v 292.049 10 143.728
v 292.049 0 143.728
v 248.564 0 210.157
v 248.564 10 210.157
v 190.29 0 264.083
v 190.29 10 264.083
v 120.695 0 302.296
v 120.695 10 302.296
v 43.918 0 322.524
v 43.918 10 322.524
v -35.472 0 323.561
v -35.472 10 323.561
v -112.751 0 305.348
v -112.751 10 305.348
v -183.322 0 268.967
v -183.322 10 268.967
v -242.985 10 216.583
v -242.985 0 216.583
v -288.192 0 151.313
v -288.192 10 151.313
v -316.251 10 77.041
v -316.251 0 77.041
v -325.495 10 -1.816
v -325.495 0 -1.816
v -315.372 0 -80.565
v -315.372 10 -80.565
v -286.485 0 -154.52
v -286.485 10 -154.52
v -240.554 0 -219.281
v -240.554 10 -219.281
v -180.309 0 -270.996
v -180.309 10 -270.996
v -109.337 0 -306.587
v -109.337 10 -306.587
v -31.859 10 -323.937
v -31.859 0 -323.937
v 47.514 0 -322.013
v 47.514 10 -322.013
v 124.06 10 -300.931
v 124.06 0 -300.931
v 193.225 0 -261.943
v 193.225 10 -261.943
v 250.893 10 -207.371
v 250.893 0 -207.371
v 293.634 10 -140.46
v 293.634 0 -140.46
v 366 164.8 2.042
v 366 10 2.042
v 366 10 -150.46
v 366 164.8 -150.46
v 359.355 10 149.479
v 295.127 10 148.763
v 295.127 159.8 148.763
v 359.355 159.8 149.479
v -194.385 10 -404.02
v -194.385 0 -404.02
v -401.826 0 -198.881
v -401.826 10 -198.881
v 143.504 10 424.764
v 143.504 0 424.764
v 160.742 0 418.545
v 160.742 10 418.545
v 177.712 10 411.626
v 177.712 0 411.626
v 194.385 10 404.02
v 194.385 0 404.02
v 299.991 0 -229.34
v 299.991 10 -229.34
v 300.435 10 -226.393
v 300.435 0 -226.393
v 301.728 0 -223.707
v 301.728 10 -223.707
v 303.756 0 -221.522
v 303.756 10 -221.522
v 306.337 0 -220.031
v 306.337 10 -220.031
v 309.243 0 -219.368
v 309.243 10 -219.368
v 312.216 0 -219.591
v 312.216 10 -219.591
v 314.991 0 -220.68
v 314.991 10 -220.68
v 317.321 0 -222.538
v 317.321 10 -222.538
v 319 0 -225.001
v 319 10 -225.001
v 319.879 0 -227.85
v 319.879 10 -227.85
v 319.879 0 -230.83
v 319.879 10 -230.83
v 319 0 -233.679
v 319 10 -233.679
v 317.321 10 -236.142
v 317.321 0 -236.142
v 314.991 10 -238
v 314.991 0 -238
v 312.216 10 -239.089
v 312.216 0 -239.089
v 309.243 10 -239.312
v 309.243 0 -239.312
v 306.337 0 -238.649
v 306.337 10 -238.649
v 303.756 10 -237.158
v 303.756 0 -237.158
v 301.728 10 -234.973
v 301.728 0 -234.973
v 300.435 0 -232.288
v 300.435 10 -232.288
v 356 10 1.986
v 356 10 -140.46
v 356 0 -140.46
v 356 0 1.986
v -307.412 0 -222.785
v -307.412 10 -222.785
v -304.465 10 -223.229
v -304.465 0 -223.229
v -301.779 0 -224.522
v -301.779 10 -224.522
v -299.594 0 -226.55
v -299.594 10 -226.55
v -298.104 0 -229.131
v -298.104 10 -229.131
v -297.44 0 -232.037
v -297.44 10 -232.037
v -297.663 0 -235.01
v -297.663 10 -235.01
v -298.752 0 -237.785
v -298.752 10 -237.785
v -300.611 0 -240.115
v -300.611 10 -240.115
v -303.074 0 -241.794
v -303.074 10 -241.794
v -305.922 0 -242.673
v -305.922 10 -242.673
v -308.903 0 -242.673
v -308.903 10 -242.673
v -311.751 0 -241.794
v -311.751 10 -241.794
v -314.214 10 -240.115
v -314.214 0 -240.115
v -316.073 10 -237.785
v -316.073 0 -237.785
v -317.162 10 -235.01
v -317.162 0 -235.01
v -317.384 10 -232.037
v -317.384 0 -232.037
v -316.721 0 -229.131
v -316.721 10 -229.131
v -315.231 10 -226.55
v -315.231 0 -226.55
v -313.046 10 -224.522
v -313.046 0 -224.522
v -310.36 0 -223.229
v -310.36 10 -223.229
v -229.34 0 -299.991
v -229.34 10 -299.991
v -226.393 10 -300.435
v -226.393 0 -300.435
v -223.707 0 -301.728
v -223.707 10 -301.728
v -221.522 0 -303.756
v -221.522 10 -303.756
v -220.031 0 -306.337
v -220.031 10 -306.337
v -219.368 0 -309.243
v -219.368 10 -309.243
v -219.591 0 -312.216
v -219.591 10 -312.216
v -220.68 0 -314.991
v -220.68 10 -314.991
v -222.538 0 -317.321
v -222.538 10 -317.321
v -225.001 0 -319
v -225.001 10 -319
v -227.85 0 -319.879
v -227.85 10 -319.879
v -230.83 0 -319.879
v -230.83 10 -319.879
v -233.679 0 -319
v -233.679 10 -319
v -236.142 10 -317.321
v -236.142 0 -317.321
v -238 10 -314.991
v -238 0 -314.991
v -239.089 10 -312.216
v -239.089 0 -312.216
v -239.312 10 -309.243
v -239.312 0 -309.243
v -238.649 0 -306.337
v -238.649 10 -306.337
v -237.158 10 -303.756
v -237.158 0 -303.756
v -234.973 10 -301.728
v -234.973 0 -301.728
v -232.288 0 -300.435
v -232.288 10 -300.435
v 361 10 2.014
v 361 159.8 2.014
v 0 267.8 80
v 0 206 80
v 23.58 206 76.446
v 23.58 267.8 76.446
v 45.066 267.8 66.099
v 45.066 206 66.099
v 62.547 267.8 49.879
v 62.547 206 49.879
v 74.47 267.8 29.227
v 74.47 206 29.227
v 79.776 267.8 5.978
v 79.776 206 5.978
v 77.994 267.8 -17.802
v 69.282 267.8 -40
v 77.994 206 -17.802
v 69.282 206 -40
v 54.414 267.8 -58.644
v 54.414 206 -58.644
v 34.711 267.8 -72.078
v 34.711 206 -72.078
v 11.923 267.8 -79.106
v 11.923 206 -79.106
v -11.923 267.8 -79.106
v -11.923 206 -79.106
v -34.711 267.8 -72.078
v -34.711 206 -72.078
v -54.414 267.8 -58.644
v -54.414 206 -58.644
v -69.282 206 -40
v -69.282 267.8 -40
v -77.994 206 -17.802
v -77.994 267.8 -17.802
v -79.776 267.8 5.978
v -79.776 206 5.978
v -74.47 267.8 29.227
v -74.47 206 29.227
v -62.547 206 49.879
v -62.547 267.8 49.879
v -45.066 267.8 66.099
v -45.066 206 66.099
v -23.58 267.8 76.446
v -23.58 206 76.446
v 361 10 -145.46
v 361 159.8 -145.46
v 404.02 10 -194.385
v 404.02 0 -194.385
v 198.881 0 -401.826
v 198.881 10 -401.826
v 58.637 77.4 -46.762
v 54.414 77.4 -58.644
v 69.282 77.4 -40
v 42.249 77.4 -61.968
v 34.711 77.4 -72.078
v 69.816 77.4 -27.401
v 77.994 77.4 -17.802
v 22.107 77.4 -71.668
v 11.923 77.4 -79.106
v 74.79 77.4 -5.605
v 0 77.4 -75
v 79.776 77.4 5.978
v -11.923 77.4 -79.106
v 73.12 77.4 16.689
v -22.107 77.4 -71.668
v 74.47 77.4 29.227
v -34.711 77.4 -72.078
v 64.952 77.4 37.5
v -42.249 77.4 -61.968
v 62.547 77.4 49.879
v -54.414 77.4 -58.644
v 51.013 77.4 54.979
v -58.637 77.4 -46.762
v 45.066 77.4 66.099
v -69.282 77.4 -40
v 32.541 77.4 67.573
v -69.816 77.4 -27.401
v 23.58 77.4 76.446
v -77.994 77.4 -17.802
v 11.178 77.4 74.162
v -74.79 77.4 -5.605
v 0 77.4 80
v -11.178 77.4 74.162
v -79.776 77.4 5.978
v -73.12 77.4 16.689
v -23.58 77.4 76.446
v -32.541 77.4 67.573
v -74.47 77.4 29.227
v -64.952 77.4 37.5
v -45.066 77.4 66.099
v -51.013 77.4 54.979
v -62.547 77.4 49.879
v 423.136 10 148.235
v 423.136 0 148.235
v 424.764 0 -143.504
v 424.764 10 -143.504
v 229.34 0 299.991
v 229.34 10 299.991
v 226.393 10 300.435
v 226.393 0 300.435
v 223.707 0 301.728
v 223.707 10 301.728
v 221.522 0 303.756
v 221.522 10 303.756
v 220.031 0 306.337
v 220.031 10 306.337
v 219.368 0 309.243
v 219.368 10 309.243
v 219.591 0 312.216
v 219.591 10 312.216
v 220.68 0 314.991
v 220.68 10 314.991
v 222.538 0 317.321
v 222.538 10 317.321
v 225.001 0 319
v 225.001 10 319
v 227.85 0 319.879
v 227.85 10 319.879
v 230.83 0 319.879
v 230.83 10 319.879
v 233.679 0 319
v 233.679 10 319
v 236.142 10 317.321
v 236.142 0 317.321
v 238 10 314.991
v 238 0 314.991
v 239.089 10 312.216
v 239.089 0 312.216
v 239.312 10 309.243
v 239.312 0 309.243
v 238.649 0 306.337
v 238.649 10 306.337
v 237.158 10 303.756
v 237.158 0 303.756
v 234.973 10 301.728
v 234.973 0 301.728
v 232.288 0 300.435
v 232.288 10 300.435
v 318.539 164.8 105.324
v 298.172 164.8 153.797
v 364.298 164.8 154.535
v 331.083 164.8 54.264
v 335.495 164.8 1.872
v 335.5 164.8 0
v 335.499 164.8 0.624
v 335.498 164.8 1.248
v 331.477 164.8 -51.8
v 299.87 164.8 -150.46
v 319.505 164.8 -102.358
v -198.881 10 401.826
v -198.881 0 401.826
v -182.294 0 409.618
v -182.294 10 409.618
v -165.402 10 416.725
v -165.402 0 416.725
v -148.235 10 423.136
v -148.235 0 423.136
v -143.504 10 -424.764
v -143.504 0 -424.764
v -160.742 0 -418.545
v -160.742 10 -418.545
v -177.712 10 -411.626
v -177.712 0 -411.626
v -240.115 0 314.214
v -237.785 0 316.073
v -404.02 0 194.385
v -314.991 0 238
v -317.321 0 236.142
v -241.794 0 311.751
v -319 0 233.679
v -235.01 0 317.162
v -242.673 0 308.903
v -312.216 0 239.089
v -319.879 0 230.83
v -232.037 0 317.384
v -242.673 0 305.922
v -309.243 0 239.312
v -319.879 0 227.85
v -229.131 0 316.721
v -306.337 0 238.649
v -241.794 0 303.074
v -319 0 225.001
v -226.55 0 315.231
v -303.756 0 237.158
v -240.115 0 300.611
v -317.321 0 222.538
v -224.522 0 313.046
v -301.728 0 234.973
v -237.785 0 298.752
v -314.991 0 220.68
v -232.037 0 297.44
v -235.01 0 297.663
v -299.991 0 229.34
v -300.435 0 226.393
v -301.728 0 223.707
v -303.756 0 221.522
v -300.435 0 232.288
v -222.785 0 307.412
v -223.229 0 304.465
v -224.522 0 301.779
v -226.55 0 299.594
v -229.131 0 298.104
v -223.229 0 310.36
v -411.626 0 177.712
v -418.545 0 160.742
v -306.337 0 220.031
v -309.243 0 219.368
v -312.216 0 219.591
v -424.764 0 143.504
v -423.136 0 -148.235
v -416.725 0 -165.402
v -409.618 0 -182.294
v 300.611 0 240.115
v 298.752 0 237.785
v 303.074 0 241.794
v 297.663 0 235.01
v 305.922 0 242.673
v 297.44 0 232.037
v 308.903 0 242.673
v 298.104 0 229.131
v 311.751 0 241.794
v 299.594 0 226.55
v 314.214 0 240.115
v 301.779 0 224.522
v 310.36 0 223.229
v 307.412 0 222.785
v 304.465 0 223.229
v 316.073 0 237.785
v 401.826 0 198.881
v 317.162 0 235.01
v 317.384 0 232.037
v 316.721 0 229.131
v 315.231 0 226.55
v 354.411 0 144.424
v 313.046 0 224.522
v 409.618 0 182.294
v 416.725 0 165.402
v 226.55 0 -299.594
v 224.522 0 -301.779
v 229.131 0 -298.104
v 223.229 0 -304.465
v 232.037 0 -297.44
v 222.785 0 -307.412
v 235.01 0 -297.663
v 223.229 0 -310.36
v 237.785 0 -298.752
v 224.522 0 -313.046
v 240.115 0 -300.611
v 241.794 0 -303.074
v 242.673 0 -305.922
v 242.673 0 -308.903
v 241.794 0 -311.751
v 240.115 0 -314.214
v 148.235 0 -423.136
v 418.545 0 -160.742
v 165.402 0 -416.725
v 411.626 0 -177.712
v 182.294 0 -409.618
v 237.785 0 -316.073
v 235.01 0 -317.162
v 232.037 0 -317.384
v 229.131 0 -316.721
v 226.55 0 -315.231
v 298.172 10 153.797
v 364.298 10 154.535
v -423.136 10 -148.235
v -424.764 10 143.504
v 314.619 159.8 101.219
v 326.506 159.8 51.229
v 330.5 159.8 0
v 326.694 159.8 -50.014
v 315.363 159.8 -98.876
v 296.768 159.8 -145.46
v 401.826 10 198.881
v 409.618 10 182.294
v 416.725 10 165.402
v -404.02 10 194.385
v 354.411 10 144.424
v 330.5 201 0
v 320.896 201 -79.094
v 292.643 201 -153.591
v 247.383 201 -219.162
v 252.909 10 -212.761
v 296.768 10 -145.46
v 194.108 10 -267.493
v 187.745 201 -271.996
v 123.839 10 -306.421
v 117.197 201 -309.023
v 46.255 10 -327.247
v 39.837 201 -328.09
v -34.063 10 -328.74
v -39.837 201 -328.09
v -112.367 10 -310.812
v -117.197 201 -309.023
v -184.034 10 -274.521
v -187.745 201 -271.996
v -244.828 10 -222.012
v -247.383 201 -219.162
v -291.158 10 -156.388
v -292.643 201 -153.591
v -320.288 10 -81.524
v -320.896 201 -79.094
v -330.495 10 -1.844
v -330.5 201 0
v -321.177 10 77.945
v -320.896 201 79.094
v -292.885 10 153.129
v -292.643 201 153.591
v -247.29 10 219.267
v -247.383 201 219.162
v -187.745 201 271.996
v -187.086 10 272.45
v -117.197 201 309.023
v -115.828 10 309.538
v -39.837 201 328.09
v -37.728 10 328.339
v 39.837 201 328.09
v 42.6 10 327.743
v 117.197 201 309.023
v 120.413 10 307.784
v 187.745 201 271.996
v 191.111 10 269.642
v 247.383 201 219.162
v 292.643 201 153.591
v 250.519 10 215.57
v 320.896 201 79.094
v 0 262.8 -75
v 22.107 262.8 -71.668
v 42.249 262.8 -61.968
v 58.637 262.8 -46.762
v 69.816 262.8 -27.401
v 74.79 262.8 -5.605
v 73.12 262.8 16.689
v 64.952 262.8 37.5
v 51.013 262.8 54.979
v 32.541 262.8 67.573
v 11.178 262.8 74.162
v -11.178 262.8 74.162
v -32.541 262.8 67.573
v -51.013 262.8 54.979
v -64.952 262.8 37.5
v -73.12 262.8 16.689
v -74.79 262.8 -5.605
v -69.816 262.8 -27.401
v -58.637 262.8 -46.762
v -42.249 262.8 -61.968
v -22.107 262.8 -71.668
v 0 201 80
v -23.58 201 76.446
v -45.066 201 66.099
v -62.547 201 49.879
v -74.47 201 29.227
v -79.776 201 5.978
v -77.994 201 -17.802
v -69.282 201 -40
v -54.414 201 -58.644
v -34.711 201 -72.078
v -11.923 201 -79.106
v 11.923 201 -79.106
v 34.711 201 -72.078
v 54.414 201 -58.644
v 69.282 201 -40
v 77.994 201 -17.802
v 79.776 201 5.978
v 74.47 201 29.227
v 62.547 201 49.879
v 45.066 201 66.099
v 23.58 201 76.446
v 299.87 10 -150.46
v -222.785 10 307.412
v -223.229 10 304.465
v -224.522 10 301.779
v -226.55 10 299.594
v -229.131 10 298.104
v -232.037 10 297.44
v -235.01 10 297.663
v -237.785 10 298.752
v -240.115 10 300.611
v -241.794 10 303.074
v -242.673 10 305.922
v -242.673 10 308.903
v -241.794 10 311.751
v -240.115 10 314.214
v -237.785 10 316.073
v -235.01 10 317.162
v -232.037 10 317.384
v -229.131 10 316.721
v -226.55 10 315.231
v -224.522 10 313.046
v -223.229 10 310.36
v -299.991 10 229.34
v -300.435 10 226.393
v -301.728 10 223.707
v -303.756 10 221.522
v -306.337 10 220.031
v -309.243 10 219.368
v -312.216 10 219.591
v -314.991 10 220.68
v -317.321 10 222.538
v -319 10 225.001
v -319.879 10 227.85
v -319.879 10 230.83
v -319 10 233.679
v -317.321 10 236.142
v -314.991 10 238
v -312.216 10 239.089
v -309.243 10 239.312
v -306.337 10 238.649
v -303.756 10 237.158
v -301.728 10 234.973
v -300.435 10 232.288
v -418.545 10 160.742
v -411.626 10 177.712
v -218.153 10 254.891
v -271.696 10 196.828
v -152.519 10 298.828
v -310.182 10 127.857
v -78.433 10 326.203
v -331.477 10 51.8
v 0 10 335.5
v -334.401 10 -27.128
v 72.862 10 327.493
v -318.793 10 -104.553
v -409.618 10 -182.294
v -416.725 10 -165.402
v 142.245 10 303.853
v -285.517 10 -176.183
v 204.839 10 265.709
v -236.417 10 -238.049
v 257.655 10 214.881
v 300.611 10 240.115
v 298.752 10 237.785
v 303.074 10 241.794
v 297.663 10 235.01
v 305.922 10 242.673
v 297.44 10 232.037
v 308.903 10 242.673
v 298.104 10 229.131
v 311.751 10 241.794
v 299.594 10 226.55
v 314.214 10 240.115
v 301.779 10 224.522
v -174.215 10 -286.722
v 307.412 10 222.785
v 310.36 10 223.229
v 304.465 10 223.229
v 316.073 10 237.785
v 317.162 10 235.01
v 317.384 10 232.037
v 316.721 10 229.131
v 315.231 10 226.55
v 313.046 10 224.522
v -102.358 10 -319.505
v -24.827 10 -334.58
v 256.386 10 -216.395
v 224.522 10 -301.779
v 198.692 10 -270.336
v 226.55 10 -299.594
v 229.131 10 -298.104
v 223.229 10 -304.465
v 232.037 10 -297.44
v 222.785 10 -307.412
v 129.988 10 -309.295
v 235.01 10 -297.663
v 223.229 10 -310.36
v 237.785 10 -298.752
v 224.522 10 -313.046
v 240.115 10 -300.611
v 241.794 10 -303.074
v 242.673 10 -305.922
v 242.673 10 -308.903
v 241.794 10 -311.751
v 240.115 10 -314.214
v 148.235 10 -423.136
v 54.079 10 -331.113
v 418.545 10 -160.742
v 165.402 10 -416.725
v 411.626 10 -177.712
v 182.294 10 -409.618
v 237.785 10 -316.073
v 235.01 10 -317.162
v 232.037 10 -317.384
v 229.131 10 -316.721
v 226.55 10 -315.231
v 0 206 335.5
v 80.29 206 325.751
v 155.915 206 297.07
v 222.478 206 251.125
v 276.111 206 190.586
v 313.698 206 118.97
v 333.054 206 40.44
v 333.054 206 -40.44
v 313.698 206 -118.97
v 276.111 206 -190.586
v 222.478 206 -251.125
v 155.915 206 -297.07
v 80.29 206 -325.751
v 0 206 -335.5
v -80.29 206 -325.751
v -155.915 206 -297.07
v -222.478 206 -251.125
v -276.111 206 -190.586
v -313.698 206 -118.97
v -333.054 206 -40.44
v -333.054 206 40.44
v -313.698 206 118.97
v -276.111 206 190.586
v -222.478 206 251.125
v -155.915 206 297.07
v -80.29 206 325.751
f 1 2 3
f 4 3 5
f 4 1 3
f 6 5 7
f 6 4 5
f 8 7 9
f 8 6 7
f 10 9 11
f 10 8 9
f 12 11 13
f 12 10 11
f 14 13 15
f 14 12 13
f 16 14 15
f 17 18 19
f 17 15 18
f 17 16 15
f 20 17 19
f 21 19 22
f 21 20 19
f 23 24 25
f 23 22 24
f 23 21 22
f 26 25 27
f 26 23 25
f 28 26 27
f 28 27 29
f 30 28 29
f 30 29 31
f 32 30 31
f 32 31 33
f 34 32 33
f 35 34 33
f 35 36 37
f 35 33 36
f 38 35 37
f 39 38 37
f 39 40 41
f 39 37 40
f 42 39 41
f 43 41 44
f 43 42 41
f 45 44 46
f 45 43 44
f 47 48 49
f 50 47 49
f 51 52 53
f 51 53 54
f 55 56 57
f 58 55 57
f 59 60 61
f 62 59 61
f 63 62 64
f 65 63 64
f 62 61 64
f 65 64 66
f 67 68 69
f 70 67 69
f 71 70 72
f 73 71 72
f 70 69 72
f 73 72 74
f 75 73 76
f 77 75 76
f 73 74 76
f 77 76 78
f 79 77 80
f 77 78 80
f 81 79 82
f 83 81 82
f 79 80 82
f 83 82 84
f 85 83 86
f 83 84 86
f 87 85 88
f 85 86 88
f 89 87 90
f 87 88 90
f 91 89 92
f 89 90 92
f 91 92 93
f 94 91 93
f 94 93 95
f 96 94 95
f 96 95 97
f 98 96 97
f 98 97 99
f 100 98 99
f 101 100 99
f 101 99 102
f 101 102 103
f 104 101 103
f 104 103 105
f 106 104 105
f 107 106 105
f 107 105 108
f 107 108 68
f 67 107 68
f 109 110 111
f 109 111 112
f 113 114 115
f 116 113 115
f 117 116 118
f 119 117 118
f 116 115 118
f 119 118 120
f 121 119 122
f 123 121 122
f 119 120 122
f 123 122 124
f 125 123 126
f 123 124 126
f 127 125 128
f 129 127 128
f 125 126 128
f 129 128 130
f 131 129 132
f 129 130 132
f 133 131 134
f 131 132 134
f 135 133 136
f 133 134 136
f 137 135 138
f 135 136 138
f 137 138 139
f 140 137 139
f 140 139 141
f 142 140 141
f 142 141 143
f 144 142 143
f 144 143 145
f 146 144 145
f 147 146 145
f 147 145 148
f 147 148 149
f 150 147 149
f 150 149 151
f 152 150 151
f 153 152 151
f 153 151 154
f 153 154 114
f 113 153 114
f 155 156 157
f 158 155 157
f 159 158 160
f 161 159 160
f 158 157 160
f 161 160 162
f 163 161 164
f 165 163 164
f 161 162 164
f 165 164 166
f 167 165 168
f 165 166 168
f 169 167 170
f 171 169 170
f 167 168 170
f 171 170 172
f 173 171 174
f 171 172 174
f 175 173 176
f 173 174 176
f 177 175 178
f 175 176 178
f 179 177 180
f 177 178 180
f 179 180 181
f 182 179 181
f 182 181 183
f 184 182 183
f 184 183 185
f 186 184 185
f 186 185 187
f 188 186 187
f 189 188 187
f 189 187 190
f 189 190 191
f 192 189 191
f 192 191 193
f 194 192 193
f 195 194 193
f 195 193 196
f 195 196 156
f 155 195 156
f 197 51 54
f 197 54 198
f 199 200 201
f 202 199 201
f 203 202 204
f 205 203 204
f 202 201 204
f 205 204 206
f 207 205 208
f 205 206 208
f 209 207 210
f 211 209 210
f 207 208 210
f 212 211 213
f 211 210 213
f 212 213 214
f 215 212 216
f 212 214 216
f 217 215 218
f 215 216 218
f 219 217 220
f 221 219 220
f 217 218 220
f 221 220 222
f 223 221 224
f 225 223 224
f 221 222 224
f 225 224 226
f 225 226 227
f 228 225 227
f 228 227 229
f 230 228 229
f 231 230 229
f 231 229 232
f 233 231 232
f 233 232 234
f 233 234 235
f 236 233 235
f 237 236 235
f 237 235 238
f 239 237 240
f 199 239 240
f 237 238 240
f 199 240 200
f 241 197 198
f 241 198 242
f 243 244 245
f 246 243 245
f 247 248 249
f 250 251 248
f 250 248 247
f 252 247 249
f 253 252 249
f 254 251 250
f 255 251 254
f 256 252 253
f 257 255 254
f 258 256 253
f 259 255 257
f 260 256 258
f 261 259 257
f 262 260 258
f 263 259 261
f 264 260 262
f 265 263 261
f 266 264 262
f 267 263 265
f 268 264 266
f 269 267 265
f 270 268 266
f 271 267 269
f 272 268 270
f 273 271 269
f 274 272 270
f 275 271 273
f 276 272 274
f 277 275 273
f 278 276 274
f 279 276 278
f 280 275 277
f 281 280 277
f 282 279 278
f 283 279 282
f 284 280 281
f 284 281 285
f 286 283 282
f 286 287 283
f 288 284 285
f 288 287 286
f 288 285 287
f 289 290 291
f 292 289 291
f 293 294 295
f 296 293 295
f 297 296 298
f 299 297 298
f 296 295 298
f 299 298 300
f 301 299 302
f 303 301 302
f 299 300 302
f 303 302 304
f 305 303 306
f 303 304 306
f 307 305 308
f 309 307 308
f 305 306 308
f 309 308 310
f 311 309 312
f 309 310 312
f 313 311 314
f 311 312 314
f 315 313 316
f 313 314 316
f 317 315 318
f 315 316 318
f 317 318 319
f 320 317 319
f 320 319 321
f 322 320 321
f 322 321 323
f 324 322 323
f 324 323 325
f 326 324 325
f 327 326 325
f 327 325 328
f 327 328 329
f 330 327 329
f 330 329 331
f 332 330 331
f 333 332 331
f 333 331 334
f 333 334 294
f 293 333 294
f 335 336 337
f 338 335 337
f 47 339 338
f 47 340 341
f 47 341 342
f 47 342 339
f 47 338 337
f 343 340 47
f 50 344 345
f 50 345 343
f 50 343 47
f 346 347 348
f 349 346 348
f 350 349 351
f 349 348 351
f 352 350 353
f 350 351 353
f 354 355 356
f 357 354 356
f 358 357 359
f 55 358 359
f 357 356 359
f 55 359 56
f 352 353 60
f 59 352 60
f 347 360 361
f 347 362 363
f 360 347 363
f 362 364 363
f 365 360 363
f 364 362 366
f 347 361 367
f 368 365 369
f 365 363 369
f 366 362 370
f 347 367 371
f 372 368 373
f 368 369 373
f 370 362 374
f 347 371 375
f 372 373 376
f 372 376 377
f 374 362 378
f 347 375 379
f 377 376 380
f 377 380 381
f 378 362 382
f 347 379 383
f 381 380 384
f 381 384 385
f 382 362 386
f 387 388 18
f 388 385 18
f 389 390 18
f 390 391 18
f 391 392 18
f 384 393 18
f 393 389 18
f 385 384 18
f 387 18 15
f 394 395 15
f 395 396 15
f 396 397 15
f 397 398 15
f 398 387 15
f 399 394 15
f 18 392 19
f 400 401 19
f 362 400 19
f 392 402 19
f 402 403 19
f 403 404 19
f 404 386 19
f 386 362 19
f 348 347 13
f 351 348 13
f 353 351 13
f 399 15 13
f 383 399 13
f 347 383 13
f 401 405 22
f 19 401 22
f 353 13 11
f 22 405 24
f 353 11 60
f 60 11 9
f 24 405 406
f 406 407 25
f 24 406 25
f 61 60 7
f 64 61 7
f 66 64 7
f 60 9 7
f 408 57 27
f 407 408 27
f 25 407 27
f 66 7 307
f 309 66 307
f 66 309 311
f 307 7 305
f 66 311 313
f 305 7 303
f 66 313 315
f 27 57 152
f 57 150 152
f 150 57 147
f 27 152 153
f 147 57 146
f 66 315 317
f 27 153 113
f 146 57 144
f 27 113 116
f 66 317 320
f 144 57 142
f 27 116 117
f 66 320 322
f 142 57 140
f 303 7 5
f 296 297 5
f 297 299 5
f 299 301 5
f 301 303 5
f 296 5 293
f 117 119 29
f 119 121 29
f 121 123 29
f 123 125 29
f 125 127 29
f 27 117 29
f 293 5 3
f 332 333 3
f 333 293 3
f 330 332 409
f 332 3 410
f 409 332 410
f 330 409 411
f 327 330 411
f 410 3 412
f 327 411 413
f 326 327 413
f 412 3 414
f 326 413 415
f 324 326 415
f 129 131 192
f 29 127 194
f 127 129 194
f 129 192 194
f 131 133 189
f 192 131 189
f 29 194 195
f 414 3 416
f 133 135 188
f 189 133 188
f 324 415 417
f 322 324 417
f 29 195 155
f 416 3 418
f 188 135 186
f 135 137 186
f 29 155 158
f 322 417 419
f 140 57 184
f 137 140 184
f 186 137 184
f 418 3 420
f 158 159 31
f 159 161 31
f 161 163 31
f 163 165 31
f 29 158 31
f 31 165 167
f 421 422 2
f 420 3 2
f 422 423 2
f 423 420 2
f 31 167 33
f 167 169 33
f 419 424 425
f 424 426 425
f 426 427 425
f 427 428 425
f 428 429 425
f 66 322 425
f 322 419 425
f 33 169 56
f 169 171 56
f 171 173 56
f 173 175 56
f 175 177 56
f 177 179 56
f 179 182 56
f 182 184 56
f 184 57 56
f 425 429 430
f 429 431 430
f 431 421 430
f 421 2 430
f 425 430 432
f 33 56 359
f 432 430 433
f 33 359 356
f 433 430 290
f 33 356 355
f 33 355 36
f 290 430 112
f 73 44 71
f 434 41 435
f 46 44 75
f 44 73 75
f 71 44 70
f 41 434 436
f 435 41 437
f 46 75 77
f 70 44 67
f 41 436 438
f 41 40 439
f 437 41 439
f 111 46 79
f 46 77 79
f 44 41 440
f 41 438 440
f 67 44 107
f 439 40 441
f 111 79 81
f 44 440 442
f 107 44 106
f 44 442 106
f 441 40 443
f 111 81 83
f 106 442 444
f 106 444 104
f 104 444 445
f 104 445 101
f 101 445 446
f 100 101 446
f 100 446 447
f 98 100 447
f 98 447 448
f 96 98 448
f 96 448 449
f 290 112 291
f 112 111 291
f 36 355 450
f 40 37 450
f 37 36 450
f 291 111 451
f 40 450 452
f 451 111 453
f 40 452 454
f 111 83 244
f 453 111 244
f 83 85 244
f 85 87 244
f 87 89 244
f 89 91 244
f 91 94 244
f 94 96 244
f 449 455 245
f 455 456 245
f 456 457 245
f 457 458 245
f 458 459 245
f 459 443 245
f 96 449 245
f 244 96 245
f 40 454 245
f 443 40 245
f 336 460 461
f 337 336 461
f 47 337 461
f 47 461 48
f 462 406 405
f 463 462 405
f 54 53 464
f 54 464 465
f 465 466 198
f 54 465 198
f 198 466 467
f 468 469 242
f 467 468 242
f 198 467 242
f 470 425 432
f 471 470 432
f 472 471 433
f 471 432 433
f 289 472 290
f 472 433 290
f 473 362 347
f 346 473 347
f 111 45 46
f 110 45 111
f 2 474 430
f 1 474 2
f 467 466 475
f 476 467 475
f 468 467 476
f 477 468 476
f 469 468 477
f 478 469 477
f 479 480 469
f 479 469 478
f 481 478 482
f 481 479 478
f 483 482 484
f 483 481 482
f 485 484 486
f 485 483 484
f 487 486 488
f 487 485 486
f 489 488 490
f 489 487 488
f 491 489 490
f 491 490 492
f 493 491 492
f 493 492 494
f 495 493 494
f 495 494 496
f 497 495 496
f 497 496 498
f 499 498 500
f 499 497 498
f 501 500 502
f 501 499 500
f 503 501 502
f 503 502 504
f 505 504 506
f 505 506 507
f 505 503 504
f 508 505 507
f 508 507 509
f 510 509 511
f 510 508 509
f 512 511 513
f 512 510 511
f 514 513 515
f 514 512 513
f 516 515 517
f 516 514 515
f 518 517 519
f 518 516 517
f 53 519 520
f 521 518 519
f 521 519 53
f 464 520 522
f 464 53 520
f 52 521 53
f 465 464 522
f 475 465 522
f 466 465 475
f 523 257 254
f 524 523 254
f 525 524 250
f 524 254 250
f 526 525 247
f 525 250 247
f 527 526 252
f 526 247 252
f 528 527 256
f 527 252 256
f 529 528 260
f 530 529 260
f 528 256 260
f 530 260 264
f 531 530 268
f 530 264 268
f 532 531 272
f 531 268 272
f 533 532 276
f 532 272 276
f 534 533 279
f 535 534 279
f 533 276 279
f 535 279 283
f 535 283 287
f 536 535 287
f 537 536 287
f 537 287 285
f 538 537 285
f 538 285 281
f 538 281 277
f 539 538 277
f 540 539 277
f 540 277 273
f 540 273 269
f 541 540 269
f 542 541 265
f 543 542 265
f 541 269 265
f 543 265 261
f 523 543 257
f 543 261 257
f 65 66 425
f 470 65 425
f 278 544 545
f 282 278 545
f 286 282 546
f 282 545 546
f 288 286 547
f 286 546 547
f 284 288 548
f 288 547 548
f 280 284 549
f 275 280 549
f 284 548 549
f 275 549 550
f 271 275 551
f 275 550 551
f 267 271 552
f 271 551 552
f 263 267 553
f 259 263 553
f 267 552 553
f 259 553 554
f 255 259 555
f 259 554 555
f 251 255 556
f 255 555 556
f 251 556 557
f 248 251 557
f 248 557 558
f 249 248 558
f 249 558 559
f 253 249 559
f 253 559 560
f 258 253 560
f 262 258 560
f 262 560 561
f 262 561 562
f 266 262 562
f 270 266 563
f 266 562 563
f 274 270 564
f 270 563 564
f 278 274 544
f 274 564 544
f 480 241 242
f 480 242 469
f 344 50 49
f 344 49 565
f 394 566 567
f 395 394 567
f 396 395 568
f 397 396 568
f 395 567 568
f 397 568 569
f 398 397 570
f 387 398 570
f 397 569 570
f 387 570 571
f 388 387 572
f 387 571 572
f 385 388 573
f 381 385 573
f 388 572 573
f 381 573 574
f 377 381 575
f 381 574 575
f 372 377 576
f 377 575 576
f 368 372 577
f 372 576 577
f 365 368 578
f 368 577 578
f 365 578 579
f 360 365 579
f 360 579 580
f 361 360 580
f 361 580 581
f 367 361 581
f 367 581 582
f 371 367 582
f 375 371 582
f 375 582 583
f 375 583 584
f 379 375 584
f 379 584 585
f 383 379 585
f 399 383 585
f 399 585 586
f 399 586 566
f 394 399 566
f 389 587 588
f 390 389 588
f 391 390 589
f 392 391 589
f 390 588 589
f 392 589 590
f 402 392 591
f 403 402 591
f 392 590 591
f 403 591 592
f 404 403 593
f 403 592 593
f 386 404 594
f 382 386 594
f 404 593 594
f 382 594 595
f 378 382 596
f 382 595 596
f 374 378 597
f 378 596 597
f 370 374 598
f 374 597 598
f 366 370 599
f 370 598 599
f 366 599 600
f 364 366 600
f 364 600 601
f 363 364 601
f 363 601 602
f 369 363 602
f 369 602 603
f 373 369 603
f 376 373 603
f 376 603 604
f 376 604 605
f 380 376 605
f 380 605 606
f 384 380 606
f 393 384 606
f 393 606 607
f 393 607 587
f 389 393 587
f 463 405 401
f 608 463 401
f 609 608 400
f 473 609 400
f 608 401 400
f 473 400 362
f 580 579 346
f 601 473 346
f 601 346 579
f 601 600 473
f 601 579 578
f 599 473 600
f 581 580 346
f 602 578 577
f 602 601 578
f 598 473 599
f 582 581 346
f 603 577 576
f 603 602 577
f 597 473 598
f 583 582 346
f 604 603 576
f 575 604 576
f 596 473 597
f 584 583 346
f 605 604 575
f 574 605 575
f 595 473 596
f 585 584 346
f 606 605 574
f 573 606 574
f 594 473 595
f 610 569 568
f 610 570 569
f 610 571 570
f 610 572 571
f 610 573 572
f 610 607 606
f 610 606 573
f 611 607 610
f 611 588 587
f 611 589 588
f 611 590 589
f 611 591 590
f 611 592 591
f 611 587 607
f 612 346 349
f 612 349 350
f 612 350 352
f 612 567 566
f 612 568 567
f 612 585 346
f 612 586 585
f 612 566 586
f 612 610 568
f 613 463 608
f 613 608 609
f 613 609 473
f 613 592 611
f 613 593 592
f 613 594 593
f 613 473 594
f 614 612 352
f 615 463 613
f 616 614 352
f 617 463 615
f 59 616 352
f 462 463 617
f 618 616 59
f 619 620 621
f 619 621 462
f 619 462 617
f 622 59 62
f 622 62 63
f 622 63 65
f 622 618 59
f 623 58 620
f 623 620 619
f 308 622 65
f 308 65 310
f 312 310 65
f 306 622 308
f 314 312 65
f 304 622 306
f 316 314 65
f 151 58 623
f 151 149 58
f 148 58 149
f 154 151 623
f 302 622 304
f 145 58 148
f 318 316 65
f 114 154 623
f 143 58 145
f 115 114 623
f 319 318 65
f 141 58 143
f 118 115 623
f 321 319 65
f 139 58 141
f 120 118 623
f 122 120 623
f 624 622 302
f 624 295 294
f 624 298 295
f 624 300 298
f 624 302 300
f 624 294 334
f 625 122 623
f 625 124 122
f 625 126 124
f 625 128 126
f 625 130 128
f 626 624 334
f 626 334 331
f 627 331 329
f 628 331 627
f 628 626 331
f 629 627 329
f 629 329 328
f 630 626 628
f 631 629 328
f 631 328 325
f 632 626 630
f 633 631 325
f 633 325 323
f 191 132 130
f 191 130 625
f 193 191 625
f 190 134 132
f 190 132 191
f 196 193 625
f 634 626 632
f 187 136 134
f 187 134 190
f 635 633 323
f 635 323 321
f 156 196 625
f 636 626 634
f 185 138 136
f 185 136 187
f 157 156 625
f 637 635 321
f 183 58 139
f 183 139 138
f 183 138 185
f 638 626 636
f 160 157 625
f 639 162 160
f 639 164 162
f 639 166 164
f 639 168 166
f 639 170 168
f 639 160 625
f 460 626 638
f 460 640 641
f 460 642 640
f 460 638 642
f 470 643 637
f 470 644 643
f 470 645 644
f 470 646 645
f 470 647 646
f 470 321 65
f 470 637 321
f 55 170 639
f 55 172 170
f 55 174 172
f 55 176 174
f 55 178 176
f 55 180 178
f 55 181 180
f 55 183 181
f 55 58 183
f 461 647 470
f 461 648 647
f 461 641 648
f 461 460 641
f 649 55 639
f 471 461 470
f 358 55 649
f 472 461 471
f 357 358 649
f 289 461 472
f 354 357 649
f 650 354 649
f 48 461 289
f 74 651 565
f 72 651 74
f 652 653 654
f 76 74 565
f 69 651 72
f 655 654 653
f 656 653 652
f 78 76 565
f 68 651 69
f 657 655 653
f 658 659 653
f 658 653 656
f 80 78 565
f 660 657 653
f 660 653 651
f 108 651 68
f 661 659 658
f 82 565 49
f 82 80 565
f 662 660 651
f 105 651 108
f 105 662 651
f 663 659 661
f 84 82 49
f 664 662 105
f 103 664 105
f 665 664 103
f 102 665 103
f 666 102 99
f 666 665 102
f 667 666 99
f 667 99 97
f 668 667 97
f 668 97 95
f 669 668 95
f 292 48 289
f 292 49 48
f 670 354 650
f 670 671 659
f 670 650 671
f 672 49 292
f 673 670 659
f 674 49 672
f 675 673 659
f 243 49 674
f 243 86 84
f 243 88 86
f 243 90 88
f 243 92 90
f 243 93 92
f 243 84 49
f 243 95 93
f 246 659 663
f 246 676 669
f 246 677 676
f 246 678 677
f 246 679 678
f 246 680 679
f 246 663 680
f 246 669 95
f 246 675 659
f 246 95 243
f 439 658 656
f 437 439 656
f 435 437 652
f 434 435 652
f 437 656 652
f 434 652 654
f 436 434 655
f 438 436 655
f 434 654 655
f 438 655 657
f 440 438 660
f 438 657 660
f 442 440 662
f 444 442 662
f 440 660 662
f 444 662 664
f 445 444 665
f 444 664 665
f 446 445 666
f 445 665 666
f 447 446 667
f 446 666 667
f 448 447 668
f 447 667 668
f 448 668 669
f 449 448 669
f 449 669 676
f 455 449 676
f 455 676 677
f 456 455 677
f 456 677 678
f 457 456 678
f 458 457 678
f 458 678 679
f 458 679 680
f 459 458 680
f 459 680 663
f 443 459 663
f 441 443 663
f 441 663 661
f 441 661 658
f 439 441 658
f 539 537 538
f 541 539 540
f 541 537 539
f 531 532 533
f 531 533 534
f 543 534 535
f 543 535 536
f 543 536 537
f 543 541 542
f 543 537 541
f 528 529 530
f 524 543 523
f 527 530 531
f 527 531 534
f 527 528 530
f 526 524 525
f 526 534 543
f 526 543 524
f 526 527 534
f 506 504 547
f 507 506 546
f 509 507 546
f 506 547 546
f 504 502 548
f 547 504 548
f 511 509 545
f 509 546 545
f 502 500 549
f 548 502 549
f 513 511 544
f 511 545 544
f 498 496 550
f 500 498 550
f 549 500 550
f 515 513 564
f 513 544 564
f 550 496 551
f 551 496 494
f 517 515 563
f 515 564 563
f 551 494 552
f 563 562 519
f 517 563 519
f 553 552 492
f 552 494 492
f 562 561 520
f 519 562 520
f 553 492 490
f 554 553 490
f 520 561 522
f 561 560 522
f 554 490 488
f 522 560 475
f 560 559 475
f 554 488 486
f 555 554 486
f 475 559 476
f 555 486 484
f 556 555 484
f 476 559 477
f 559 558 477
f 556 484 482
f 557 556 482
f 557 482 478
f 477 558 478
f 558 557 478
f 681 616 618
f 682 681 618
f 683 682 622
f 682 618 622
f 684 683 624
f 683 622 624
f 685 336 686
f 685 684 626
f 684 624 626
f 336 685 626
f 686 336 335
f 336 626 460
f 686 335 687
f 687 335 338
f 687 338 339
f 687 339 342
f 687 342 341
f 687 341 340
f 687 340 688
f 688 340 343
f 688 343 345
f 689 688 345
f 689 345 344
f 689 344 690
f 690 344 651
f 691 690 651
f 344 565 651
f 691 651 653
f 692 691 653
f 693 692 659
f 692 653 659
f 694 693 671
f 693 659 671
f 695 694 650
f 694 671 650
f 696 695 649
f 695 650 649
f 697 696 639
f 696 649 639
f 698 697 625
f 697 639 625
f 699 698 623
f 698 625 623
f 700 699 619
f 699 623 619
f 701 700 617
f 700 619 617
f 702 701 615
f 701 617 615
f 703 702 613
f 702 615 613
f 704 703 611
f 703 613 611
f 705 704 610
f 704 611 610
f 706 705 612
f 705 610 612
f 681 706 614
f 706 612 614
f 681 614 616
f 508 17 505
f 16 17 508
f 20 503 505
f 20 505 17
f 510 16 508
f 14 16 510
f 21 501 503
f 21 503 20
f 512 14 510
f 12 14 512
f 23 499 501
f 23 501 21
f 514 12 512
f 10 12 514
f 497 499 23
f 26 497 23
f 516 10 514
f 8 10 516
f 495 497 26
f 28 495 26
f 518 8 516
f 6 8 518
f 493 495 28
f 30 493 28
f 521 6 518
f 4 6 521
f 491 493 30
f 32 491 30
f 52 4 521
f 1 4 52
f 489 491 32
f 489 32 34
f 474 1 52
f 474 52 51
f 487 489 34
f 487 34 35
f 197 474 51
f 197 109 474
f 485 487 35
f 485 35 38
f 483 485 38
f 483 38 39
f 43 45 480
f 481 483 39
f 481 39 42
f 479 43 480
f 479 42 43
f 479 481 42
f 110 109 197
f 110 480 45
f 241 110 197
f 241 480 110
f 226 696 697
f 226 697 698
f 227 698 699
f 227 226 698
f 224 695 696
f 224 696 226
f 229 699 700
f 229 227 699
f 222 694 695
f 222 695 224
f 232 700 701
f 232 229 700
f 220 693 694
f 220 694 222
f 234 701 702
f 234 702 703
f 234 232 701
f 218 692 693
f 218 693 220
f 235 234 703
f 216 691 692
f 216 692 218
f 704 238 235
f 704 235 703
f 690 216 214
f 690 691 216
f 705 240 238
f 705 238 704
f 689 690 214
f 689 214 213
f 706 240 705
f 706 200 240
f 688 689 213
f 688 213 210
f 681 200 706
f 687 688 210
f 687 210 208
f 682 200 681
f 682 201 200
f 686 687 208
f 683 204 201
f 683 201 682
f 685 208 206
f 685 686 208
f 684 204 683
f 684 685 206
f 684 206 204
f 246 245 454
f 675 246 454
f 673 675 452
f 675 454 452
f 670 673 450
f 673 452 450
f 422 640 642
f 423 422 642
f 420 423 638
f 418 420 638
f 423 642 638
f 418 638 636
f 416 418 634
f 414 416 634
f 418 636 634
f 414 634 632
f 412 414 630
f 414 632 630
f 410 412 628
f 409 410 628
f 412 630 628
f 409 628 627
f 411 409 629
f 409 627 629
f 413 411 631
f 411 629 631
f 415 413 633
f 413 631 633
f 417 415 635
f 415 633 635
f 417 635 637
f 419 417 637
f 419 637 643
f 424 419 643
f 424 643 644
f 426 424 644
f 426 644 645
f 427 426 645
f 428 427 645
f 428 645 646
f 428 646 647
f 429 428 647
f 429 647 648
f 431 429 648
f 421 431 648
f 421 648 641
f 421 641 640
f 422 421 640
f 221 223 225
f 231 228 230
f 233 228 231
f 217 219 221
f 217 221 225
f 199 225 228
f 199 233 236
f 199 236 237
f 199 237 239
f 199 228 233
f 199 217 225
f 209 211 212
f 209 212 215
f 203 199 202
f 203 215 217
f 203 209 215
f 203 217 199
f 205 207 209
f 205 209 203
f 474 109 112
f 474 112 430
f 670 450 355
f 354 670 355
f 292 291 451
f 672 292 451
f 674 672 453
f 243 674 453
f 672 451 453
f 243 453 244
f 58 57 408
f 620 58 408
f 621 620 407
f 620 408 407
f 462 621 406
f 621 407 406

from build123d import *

# Parameters (mm, degrees)
EXTRUDE_1_DEPTH          = 10
SKETCH_3_R               = 335.5
EXTRUDE_4_DEPTH          = 196
EXTRUDE_5_DEPTH          = 154.8
SHELL_START              = 10
SHELL_3_OUTLINE_R        = 330.5
SHELL_3_DEPTH            = 191
SHELL_3_2_DEPTH          = 149.8
CUT_EXTRUDE_1_DEPTH      = 154.8
SKETCH_8_R               = 80
EXTRUDE_7_DEPTH          = 61.8
SKETCH_9_R               = 80
EXTRUDE_8_DEPTH          = 123.6
SKETCH_10_R              = 75
CUT_EXTRUDE_2_DEPTH      = 185.4
SKETCH_11_R              = 10
CUT_EXTRUDE_4_DEPTH      = 1000
PATTERN_CIRCULAR_1_COUNT = 4


# Read off the part's stored shape, not the designer's step: 抽壳3
with BuildPart() as part:
    # 草图2 → 凸台-拉伸1 (new body)
    with BuildSketch(Plane(origin=(0, 0, 0), x_dir=(1, 0, 0), z_dir=(0, 1, 0))):
        with BuildLine():
            ThreePointArc((198.880672379, 401.826082595), (173.884394221, 413.257716136), (148.234596604, 423.136180053))
            Line((148.234596604, 423.136180053), (-143.504075774, 424.763819947))
            ThreePointArc((-143.504075774, 424.763819947), (-169.262499161, 415.172167754), (-194.384773816, 404.020150746))
            Line((-194.384773816, 404.020150746), (-401.826082595, 198.880672379))
            ThreePointArc((-401.826082595, 198.880672379), (-413.257716136, 173.884394221), (-423.136180053, 148.234596604))
            Line((-423.136180053, 148.234596604), (-424.763819947, -143.504075774))
            ThreePointArc((-424.763819947, -143.504075774), (-415.172167754, -169.262499161), (-404.020150746, -194.384773816))
            Line((-404.020150746, -194.384773816), (-198.880672379, -401.826082595))
            ThreePointArc((-198.880672379, -401.826082595), (-173.884394221, -413.257716136), (-148.234596604, -423.136180053))
            Line((-148.234596604, -423.136180053), (143.504075774, -424.763819947))
            ThreePointArc((143.504075774, -424.763819947), (169.262499161, -415.172167754), (194.384773816, -404.020150746))
            Line((194.384773816, -404.020150746), (401.826082595, -198.880672379))
            ThreePointArc((401.826082595, -198.880672379), (413.257716136, -173.884394221), (423.136180053, -148.234596604))
            Line((423.136180053, -148.234596604), (424.763819947, 143.504075774))
            ThreePointArc((424.763819947, 143.504075774), (415.172167754, 169.262499161), (404.020150746, 194.384773816))
            Line((404.020150746, 194.384773816), (198.880672379, 401.826082595))
        make_face()
    extrude(amount=EXTRUDE_1_DEPTH)

    # 草图7 → 切除-拉伸1 (cut)
    with BuildSketch(Plane.XZ.offset(-10)):
        with BuildLine():
            Line((354.410601365, 144.423875342), (292.048813878, 143.7280081))
            ThreePointArc((292.048813878, 143.7280081), (-325.4949343, -1.815969532), (293.634330198, -140.460421931))
            Line((293.634330198, -140.460421931), (356, -140.460421931))
            Line((356, -140.460421931), (356, 1.986160414))
            Line((356, 1.986160414), (354.410601365, 144.423875342))
        make_face()
    extrude(amount=CUT_EXTRUDE_1_DEPTH, mode=Mode.SUBTRACT)


with BuildPart() as body_2:
    # 草图3 → 凸台-拉伸4 (new body)
    with BuildSketch(Plane(origin=(0, 10, 0), x_dir=(1, 0, 0), z_dir=(0, 1, 0))):
        with Locations(Location((0, 0, 0), (0, 0, 270))):
            Circle(SKETCH_3_R)
    extrude(amount=EXTRUDE_4_DEPTH)


with BuildPart() as body_3:
    # 草图6 → 凸台-拉伸5 (new body)
    with BuildSketch(Plane(origin=(0, 10, 0), x_dir=(1, 0, 0), z_dir=(0, 1, 0))):
        with BuildLine():
            Line((366, -2.041951437), (335.494778671, -1.871759687))
            ThreePointArc((335.494778671, -1.871759687), (325.812555489, -80.040169201), (298.172341087, -153.796960343))
            Line((298.172341087, -153.796960343), (364.298400285, -154.534831406))
            Line((364.298400285, -154.534831406), (366, -2.041951437))
        make_face()
        with BuildLine():
            ThreePointArc((335.5, 0), (335.498694665, -0.935883485), (335.494778671, -1.871759687))
            Line((335.494778671, -1.871759687), (366, -2.041951437))
            Line((366, -2.041951437), (366, 150.460421931))
            Line((366, 150.460421931), (299.869824144, 150.460421931))
            ThreePointArc((299.869824144, 150.460421931), (326.470960424, 77.310814249), (335.5, 0))
        make_face()
    extrude(amount=EXTRUDE_5_DEPTH)


with BuildPart() as body_2_1:
    add(body_2.part)

    # Combine 1: union body 3
    add(body_3.part)

    # 抽壳3 outline → 抽壳3 (cut)
    with BuildSketch(Plane(origin=(0, 0, 0), x_dir=(1, 0, 0), z_dir=(0, 1, 0)).offset(SHELL_START)):
        Circle(SHELL_3_OUTLINE_R)
    extrude(amount=SHELL_3_DEPTH, mode=Mode.SUBTRACT)

    # Shell 3 2 outline → Shell 3 2 (cut)
    with BuildSketch(Plane(origin=(0, 0, 0), x_dir=(1, 0, 0), z_dir=(0, 1, 0)).offset(SHELL_START)):
        with BuildLine():
            ThreePointArc((296.76845461, 145.460421931), (330.494856485, -1.84386461), (295.126953902, -148.762666958))
            Line((295.126953902, -148.762666958), (359.354500825, -149.479353374))
            Line((359.354500825, -149.479353374), (361, -2.014055926))
            Line((361, -2.014055926), (361, 145.460421931))
            Line((361, 145.460421931), (296.76845461, 145.460421931))
        make_face()
    extrude(amount=SHELL_3_2_DEPTH, mode=Mode.SUBTRACT)

    # Combine 2: union part
    add(part.part)

    # 草图8 → 凸台-拉伸7 (add)
    with BuildSketch(Plane(origin=(0, 206, 0), x_dir=(1, 0, 0), z_dir=(0, 1, 0))):
        with Locations(Location((0, 0, 0), (0, 0, 270))):
            Circle(SKETCH_8_R)
    extrude(amount=EXTRUDE_7_DEPTH)

    # 草图9 → 凸台-拉伸8 (add)
    with BuildSketch(Plane(origin=(0, 201, 0), x_dir=(-1, 0, 0), z_dir=(0, -1, 0))):
        with Locations(Location((0, 0, 0), (0, 0, 270))):
            Circle(SKETCH_9_R)
    extrude(amount=EXTRUDE_8_DEPTH)

    # 草图10 → 切除-拉伸2 (cut)
    with BuildSketch(Plane.XZ.offset(-77.4)):
        with Locations(Location((0, 0, 0), (0, 0, 270))):
            Circle(SKETCH_10_R)
    extrude(amount=-CUT_EXTRUDE_2_DEPTH, mode=Mode.SUBTRACT)

    # 草图11 → 切除-拉伸4 (cut)
    with BuildSketch(Plane(origin=(0, 206, 0), x_dir=(1, 0, 0), z_dir=(0, 1, 0))):
        with Locations(Location((-229.340075244, 309.990589083, 0), (0, 0, 270))):
            Circle(SKETCH_11_R)
        with Locations(Location((-307.412348087, 232.784629383, 0), (0, 0, 270))):
            Circle(SKETCH_11_R)
    cut_extrude_4 = extrude(amount=-CUT_EXTRUDE_4_DEPTH, mode=Mode.SUBTRACT)

    # 阵列(圆周)1: 切除-拉伸4 ×4 about axis
    pattern_circular_1_axis = Axis((0, 0, 0), (0, 1, 0))
    for i in range(1, PATTERN_CIRCULAR_1_COUNT):
        add(cut_extrude_4.rotate(pattern_circular_1_axis, i * 360 / PATTERN_CIRCULAR_1_COUNT), mode=Mode.SUBTRACT)


solid = body_2_1.part
